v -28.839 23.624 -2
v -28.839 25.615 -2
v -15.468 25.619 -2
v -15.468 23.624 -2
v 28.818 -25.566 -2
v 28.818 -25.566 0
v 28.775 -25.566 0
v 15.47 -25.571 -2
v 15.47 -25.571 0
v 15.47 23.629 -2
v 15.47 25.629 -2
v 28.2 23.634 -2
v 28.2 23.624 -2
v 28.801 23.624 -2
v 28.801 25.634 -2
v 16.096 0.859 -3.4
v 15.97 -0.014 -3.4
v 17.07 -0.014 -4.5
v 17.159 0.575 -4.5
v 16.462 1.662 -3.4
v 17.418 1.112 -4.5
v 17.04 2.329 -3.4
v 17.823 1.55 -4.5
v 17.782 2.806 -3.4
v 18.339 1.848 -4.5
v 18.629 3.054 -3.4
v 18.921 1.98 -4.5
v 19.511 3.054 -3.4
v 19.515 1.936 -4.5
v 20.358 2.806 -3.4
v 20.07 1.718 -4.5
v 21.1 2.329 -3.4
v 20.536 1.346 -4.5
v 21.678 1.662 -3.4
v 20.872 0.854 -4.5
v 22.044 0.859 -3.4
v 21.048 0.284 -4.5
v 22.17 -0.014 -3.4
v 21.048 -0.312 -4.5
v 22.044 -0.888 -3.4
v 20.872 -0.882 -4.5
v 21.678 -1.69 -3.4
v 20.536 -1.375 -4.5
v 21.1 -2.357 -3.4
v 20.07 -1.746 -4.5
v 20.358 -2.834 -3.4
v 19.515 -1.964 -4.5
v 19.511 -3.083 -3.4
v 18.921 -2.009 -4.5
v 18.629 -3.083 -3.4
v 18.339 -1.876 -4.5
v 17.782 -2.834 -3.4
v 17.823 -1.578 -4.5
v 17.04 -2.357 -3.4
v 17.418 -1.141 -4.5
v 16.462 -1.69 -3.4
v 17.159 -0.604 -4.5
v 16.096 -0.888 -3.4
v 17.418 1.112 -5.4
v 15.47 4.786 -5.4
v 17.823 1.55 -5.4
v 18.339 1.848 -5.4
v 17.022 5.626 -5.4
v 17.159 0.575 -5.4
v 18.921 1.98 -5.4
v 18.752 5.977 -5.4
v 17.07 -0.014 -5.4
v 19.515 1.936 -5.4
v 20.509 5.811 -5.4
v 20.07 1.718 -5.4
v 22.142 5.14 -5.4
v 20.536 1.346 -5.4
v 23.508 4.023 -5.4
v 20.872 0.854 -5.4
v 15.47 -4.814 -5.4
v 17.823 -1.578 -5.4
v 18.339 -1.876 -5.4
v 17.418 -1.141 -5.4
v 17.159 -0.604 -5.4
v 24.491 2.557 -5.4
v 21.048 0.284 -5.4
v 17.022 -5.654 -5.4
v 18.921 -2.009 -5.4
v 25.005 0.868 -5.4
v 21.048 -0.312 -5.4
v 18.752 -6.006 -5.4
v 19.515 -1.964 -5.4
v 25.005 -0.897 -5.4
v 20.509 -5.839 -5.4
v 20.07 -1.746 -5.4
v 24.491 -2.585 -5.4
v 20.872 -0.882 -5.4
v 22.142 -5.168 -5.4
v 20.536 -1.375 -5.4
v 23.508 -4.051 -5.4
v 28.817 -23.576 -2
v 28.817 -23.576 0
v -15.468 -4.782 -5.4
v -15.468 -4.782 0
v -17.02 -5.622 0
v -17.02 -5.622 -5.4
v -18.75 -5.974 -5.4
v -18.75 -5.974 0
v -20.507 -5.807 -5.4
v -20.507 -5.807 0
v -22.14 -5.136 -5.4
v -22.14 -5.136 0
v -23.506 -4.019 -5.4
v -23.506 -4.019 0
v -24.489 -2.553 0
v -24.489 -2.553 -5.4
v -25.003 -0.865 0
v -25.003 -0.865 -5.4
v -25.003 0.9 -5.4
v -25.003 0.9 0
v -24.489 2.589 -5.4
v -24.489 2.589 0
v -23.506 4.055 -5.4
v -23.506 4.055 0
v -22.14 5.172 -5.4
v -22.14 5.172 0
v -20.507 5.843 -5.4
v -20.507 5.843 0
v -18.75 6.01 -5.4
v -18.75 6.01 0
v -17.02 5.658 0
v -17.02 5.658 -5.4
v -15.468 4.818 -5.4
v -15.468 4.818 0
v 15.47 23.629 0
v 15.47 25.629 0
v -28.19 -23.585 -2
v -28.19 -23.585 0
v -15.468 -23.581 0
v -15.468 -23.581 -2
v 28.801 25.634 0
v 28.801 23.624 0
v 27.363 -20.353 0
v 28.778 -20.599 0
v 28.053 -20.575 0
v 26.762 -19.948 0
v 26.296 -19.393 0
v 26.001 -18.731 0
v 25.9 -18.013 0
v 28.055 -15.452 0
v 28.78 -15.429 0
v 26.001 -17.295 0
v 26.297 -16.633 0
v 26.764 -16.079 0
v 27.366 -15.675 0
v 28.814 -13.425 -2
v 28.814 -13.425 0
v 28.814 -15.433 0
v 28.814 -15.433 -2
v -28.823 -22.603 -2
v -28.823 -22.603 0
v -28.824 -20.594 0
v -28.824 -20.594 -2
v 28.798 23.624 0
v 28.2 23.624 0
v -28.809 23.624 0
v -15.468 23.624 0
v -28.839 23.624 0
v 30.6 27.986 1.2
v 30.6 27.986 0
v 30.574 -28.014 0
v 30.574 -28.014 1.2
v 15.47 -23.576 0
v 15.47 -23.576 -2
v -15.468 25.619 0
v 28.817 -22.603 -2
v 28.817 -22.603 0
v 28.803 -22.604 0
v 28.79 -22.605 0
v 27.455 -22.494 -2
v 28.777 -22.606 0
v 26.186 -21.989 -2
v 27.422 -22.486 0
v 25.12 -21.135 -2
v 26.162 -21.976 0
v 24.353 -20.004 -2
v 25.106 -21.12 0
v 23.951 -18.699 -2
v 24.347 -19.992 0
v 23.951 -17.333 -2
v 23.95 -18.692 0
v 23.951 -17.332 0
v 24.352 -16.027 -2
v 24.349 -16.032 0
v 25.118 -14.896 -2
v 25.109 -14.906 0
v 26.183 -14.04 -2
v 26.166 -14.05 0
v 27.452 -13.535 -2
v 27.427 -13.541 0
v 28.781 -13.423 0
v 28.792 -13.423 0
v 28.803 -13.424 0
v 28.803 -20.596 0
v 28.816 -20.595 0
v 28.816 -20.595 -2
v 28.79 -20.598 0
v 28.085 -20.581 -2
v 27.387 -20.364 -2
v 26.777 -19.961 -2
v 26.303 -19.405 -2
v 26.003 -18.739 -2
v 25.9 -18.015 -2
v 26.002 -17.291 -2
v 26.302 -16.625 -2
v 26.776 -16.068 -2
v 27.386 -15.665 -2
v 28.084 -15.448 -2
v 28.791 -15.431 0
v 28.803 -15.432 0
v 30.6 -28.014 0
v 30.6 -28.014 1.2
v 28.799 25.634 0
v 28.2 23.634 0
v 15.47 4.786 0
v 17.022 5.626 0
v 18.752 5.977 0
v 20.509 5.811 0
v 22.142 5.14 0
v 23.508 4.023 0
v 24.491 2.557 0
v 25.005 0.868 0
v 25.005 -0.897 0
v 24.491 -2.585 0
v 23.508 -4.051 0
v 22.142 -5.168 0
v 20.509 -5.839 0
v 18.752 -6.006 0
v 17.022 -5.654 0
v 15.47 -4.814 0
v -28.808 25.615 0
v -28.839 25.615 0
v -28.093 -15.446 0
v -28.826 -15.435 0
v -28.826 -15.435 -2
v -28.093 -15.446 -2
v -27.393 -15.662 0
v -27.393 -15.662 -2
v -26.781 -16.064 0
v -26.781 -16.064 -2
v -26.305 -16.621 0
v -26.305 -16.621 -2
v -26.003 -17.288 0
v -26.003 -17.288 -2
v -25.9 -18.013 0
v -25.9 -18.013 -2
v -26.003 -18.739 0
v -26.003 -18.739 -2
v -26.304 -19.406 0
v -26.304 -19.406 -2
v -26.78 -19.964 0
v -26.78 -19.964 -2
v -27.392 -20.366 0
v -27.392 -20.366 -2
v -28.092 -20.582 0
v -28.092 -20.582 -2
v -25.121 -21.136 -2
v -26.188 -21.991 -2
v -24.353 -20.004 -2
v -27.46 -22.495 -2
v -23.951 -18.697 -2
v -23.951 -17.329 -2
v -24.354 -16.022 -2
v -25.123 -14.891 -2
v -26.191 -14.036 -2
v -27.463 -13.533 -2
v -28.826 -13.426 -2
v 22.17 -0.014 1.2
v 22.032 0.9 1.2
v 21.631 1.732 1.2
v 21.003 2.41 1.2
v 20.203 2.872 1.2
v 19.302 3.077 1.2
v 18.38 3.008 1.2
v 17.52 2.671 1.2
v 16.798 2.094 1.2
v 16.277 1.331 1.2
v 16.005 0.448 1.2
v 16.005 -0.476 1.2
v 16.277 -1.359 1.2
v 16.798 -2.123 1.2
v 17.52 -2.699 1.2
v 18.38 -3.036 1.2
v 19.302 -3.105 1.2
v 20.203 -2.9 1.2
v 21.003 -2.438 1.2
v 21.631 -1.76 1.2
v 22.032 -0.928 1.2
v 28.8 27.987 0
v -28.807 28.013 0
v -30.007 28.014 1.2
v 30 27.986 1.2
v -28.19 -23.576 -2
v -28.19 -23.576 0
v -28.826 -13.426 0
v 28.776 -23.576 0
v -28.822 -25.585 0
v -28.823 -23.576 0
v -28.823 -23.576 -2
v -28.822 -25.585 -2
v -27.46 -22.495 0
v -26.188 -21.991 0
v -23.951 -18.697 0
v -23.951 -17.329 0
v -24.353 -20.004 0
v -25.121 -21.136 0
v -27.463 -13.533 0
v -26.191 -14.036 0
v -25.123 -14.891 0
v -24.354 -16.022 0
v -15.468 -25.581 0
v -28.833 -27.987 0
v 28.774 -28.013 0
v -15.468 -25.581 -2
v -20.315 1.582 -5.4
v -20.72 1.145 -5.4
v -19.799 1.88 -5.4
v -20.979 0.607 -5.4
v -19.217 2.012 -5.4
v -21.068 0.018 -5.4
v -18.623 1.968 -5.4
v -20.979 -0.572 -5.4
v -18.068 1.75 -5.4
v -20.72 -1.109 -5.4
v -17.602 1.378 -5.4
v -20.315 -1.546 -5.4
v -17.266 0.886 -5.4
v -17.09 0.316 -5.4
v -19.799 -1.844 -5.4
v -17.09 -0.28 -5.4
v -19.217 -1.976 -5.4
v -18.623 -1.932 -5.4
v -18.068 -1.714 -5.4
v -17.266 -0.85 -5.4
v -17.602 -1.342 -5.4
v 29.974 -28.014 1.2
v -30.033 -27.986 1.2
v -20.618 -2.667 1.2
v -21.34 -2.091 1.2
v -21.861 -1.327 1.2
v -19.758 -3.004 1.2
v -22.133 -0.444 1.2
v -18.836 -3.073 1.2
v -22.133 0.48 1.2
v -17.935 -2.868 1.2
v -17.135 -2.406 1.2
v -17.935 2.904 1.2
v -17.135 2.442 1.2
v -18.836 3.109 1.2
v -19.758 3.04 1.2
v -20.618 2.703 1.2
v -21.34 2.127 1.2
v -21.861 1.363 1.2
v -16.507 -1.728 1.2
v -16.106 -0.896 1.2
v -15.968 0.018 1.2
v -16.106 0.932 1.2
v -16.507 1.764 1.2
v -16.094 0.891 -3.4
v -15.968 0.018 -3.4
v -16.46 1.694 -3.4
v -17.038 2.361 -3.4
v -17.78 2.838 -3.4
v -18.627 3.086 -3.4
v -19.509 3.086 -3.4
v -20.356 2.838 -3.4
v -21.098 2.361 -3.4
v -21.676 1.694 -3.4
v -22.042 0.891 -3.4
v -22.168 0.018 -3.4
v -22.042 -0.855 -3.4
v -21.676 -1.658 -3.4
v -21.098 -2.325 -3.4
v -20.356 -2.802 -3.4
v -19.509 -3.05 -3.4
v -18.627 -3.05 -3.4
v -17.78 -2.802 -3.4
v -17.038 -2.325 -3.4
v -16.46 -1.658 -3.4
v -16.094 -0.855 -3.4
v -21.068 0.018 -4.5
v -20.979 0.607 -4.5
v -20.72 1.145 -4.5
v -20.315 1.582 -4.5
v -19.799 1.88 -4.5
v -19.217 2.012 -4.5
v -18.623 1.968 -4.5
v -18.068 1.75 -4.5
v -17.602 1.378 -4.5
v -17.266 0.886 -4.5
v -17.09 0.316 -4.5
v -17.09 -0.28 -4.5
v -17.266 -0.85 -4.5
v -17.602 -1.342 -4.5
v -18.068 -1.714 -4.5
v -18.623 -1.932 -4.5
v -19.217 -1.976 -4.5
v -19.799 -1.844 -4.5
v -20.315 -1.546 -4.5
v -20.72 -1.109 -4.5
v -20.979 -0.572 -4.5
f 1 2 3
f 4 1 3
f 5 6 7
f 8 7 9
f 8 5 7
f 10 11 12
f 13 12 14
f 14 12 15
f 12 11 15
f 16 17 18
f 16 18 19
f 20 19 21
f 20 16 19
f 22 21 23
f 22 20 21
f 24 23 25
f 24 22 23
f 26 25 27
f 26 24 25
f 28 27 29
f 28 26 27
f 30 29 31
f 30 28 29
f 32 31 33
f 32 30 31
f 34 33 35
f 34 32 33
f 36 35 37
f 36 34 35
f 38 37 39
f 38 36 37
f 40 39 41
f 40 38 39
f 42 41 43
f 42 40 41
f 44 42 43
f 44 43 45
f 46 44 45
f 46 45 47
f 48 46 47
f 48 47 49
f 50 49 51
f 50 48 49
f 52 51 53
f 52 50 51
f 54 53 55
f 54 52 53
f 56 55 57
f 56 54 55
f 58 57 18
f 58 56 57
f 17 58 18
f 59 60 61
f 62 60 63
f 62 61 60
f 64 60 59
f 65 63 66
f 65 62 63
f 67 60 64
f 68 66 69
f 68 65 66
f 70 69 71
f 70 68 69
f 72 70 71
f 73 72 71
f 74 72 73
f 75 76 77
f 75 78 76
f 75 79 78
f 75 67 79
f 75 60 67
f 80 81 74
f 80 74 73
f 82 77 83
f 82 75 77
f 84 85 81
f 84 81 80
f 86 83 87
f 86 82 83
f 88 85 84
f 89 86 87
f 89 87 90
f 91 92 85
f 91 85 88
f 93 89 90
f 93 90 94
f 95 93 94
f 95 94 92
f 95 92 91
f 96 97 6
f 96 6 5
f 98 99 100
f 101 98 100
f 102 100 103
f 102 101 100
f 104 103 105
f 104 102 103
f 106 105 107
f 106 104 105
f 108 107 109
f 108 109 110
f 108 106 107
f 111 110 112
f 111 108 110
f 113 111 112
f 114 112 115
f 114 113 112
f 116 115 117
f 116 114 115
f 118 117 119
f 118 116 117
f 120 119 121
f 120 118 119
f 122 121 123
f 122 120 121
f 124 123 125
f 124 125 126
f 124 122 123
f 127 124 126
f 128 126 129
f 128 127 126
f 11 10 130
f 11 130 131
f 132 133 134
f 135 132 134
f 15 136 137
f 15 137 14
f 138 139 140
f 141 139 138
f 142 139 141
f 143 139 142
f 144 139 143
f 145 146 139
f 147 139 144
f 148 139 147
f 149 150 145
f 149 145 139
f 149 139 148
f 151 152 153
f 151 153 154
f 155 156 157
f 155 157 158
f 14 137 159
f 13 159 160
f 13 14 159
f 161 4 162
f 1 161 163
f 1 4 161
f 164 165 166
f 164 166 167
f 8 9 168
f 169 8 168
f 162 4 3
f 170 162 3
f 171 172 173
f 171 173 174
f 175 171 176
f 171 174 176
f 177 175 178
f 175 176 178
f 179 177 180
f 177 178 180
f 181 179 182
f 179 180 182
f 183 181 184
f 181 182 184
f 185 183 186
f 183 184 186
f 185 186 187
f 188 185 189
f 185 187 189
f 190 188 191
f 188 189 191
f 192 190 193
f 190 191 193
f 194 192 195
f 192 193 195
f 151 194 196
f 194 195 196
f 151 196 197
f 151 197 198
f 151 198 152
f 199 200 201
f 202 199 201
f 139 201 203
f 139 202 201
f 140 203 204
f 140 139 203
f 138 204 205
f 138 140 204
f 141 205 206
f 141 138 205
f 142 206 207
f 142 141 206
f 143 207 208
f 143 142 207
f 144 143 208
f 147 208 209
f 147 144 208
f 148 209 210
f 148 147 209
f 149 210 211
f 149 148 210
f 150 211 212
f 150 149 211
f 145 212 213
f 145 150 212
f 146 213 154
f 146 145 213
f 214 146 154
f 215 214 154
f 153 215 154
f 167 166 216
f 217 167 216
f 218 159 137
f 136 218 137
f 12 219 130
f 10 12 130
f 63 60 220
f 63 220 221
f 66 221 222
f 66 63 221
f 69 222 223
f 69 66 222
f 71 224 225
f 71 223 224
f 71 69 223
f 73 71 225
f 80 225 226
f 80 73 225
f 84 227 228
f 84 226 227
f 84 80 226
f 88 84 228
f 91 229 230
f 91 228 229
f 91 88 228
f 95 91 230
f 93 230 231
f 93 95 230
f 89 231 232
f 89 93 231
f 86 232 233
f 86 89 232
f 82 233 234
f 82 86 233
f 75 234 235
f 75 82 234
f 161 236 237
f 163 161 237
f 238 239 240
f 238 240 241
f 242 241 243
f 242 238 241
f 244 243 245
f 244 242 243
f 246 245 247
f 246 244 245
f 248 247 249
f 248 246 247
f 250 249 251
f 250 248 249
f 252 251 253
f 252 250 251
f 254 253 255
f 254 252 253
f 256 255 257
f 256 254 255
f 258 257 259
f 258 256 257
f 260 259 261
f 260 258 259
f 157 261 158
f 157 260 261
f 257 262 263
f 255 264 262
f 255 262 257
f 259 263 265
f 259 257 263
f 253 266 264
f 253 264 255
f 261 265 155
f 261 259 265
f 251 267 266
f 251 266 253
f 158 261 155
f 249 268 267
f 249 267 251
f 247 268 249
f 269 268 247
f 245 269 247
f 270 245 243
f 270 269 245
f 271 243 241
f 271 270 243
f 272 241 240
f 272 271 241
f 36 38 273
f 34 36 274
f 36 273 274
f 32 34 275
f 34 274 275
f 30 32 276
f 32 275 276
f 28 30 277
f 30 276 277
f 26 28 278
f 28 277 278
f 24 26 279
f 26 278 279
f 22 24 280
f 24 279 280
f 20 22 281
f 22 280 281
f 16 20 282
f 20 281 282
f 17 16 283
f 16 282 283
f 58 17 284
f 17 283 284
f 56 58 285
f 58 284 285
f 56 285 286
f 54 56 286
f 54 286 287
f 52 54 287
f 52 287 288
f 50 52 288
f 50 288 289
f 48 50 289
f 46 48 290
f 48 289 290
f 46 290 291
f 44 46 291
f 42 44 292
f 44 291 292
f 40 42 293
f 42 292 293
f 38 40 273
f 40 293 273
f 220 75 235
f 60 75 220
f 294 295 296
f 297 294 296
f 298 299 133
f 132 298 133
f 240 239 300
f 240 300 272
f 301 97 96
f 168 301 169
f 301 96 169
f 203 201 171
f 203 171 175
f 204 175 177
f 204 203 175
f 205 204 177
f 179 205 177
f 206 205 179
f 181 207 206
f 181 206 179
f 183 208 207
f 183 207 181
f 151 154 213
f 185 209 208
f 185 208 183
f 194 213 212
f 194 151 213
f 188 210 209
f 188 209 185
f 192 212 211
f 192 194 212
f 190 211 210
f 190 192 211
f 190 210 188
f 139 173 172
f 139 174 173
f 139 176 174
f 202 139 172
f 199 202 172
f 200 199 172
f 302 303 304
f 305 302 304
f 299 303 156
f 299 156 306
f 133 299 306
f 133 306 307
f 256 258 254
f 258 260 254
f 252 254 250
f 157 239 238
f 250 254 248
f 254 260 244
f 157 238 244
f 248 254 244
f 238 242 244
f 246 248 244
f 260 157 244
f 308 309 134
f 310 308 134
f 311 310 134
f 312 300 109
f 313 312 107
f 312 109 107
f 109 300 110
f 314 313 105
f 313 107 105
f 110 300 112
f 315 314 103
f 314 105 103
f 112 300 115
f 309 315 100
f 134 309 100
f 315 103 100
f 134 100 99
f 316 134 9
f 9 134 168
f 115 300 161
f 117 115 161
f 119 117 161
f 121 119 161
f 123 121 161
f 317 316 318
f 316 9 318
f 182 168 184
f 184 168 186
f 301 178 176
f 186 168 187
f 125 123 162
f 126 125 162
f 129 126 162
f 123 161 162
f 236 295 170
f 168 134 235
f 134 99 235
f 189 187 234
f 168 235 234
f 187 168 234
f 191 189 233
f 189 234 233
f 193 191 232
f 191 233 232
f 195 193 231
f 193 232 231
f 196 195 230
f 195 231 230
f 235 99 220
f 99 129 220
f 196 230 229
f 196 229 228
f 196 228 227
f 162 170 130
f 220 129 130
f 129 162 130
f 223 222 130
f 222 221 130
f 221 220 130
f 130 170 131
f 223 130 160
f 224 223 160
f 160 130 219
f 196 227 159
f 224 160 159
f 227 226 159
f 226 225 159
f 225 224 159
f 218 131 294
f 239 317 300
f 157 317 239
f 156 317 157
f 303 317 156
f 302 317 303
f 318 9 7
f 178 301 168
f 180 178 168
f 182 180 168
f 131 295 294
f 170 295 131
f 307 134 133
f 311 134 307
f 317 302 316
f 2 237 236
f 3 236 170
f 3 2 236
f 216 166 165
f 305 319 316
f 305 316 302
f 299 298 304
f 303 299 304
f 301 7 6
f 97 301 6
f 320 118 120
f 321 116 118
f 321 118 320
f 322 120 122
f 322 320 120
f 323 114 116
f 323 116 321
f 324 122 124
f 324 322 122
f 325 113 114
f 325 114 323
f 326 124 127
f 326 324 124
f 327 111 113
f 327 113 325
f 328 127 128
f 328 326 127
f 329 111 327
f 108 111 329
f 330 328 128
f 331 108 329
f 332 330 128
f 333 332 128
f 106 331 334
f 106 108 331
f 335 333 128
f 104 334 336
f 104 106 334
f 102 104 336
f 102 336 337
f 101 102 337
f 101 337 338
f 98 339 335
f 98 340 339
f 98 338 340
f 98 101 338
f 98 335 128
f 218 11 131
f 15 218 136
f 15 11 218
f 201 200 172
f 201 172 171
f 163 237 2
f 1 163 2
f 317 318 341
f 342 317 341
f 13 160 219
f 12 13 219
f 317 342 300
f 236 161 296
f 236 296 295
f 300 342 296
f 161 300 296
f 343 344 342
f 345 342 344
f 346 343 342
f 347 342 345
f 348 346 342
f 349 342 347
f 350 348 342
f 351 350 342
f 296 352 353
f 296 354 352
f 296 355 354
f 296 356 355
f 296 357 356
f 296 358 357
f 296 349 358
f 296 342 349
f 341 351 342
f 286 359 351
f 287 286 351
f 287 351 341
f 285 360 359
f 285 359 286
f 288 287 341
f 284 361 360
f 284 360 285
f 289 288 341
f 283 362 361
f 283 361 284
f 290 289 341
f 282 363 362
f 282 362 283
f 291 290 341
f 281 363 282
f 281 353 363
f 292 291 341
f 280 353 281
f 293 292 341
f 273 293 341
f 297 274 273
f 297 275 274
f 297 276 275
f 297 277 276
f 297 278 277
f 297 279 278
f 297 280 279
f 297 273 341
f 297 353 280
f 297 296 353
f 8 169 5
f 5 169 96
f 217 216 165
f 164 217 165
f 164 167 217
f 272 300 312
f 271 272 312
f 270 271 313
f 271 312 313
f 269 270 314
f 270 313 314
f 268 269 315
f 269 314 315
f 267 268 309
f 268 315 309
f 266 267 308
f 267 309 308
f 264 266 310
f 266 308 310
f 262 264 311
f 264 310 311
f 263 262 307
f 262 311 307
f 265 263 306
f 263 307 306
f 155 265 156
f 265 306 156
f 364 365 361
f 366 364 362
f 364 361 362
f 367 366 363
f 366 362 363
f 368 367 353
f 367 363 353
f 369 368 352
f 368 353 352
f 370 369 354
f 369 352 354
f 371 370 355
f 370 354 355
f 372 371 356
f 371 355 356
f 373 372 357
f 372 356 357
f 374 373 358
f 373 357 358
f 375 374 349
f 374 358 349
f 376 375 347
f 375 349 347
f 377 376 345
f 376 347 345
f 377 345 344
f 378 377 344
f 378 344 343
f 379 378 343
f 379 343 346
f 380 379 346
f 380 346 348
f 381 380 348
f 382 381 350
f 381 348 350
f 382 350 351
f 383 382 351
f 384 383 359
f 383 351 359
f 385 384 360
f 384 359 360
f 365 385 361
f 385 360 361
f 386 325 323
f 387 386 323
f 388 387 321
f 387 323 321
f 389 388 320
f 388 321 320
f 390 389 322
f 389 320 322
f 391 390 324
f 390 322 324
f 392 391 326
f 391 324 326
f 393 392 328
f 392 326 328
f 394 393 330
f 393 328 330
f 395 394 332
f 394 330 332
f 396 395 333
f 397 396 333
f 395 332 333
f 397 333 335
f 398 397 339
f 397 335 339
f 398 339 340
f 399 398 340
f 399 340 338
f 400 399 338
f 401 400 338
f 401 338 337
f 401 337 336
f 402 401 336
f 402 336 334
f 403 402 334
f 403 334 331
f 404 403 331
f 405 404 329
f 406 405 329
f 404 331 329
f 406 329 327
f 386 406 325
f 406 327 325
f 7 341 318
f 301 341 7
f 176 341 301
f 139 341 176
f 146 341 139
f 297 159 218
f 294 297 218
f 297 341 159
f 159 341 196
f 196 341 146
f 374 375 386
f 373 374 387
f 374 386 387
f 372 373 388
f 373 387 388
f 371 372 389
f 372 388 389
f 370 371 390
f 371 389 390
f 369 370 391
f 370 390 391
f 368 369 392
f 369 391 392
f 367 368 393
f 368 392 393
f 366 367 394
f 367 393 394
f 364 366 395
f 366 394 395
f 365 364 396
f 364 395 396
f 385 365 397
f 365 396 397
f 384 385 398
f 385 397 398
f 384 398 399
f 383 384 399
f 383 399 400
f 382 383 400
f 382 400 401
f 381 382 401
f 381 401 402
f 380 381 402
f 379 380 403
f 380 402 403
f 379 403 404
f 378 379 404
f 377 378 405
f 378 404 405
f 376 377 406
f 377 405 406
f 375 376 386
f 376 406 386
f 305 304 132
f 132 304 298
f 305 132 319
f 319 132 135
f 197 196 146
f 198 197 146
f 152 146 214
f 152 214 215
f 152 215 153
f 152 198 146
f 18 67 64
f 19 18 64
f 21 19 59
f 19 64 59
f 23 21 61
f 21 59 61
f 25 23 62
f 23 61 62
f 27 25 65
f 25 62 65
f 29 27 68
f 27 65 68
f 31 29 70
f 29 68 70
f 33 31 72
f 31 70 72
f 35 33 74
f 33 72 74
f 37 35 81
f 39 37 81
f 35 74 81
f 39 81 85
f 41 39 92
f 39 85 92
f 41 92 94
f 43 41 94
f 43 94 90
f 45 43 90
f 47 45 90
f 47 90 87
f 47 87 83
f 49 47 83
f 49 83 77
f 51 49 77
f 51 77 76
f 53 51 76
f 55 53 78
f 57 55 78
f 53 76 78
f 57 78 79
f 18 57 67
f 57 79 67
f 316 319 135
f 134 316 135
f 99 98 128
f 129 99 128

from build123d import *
from build123d.topology import SkipClean

# Parameters (mm, degrees)
SKETCH_3_R          = 2.6
EXTRUDE_1_DEPTH     = 1.2
EXTRUDE_1_2_DEPTH   = 2
CUT_EXTRUDE_2_DEPTH = 2
SKETCH_7_W          = 61.190195572
SKETCH_7_H          = 47.2
CUT_EXTRUDE_1_DEPTH = 2
EXTRUDE_START       = 5.4
SKETCH_8_R          = 6
SKETCH_8_R_2        = 2.6
EXTRUDE_2_DEPTH     = 5.4
SKETCH_9_R          = 3
SKETCH_9_R_2        = 2
EXTRUDE_2_2_DEPTH   = 2
SKETCH_10_R         = 4.6
SKETCH_10_R_2       = 2
EXTRUDE_3_DEPTH     = 2
CUT_EXTRUDE_START   = -2
SKETCH_11_R         = 2.6
SKETCH_11_R_2       = 2
CUT_EXTRUDE_3_DEPTH = 2
CUT_EXTRUDE_4_DEPTH = 62
SKETCH_13_W         = 4.275106326
SKETCH_13_H         = 2
SKETCH_13_W_2       = 4.284804349
CUT_EXTRUDE_5_DEPTH = 62
SKETCH_14_W         = 30.93798866
SKETCH_14_H         = 51.210222553
CUT_EXTRUDE_6_DEPTH = 5.4
SKETCH_17_R         = 3.1
CUT_EXTRUDE_8_DEPTH = 4.6
CHAMFER_1_SIZE      = 1.1


with BuildPart() as part:
    # Эскиз3 → Extrude 1 (new body)
    with BuildSketch(Plane.XY):
        Polygon((30.6, -28.01415885), (30.6, 27.98584115), (-30.607237283, 28.01415885), (-30.588738779, -27.985838095), align=None)
        with Locations((-19.06798866, 0.017969087)):
            Circle(SKETCH_3_R, mode=Mode.SUBTRACT)
        with Locations((19.07, -0.01415885)):
            Circle(SKETCH_3_R, mode=Mode.SUBTRACT)
    extrude(amount=EXTRUDE_1_DEPTH)

    # Эскиз5 → Extrude 1 2 (add)
    with BuildSketch(Plane(origin=(0, 0, 0), x_dir=(-1, 0, 0), z_dir=(0, 0, -1))):
        Polygon((-30.6, 26.034377354), (30.606576622, 26.014158959), (30.58939944, -25.985838204), (-30.6, -25.965625483), align=None)
        Polygon((-28.2, 23.63358443), (28.20578396, 23.614951883), (28.190192364, -23.585045542), (-28.2, -23.566418145), align=None, mode=Mode.SUBTRACT)
    extrude(amount=EXTRUDE_1_2_DEPTH)

    # Эскиз6 → Вырез-Вытянуть-Тонкостенный2 (cut)
    with BuildSketch(Plane(origin=(0, 0, -2), x_dir=(-1, 0, 0), z_dir=(0, 0, -1))):
        Polygon((-30.6, 26.034377354), (-30.6, -25.965625483), (30.58939944, -25.985838204), (30.606576622, 26.014158959), align=None)
        Polygon((-30.2, 25.6342452), (-30.2, -25.565757593), (30.189531594, -25.585706094), (30.206444512, 25.614291113), align=None, mode=Mode.SUBTRACT)
    extrude(amount=-CUT_EXTRUDE_2_DEPTH, mode=Mode.SUBTRACT)

    # Эскиз7 → Вырез-Вытянуть1 (cut)
    with BuildSketch(Plane(origin=(0, 0, -2), x_dir=(-1, 0, 0), z_dir=(0, 0, -1))):
        with Locations((-0.004902214, 0.024268156)):
            Rectangle(SKETCH_7_W, SKETCH_7_H)
    extrude(amount=-CUT_EXTRUDE_1_DEPTH, mode=Mode.SUBTRACT)

    # Эскиз8 → Extrude 2 (add)
    # profile 1 of 2: a face of its own
    with SkipClean():  # the faces are left unmerged after this step: merging them gives an invalid solid
        with BuildSketch(Plane(origin=(0, 0, 0), x_dir=(-1, 0, 0), z_dir=(0, 0, -1)).offset(EXTRUDE_START)):
            with Locations(Location((-19.07, -0.01415885, 0), (0, 0, 180))):
                Circle(SKETCH_8_R)
            with Locations((-19.07, -0.01415885)):
                Circle(SKETCH_8_R_2, mode=Mode.SUBTRACT)
        # profile 2 of 2: a face of its own
        with BuildSketch(Plane(origin=(0, 0, 0), x_dir=(-1, 0, 0), z_dir=(0, 0, -1)).offset(EXTRUDE_START)):
            with Locations(Location((19.06798866, 0.017969087, 0), (0, 0, 180))):
                Circle(SKETCH_8_R)
            with Locations((19.06798866, 0.017969087)):
                Circle(SKETCH_8_R_2, mode=Mode.SUBTRACT)
        extrude(amount=-EXTRUDE_2_DEPTH)

    # Эскиз9 → Extrude 2 2 (add)
    # profile 1 of 2: a face of its own
    with SkipClean():  # the faces are left unmerged after this step: merging them gives an invalid solid
        with BuildSketch(Plane(origin=(0, 0, -5.4), x_dir=(-1, 0, 0), z_dir=(0, 0, -1))):
            with Locations((-19.07, -0.01415885)):
                Circle(SKETCH_9_R)
            with Locations((-19.07, -0.01415885)):
                Circle(SKETCH_9_R_2, mode=Mode.SUBTRACT)
        # profile 2 of 2: a face of its own
        with BuildSketch(Plane(origin=(0, 0, -5.4), x_dir=(-1, 0, 0), z_dir=(0, 0, -1))):
            with Locations((19.06798866, 0.017969087)):
                Circle(SKETCH_9_R)
            with Locations((19.06798866, 0.017969087)):
                Circle(SKETCH_9_R_2, mode=Mode.SUBTRACT)
        extrude(amount=-EXTRUDE_2_2_DEPTH)

    # Эскиз10 → Вытянуть-Тонкостенный3 (add)
    # profile 1 of 2: a face of its own
    with SkipClean():  # the faces are left unmerged after this step: merging them gives an invalid solid
        with BuildSketch(Plane(origin=(0, 0, 0), x_dir=(-1, 0, 0), z_dir=(0, 0, -1))):
            with Locations((28.5, -18.01415885)):
                Circle(SKETCH_10_R)
            with Locations((28.5, -18.01415885)):
                Circle(SKETCH_10_R_2, mode=Mode.SUBTRACT)
        # profile 2 of 2: a face of its own
        with BuildSketch(Plane(origin=(0, 0, 0), x_dir=(-1, 0, 0), z_dir=(0, 0, -1))):
            with Locations((-28.5, -18.01415885)):
                Circle(SKETCH_10_R)
            with Locations((-28.5, -18.01415885)):
                Circle(SKETCH_10_R_2, mode=Mode.SUBTRACT)
        extrude(amount=EXTRUDE_3_DEPTH)

    # Эскиз11 → Вырез-Вытянуть-Тонкостенный3 (cut)
    # profile 1 of 2: a face of its own
    with SkipClean():  # the faces are left unmerged after this step: merging them gives an invalid solid
        with BuildSketch(Plane(origin=(0, 0, -2), x_dir=(-1, 0, 0), z_dir=(0, 0, -1)).offset(CUT_EXTRUDE_START)):
            with Locations((28.5, -18.01415885)):
                Circle(SKETCH_11_R)
            with Locations((28.5, -18.01415885)):
                Circle(SKETCH_11_R_2, mode=Mode.SUBTRACT)
        # profile 2 of 2: a face of its own
        with BuildSketch(Plane(origin=(0, 0, -2), x_dir=(-1, 0, 0), z_dir=(0, 0, -1)).offset(CUT_EXTRUDE_START)):
            with Locations((-28.5, -18.01415885)):
                Circle(SKETCH_11_R)
            with Locations((-28.5, -18.01415885)):
                Circle(SKETCH_11_R_2, mode=Mode.SUBTRACT)
        extrude(amount=CUT_EXTRUDE_3_DEPTH, mode=Mode.SUBTRACT)

    # Эскиз12 → Вырез-Вытянуть4 (cut)
    with SkipClean():  # the faces are left unmerged after this step: merging them gives an invalid solid
        with BuildSketch(Plane(origin=(0.012954275, 27.999992332, 0), x_dir=(0.9999998929762139, -0.0004626527434190302, 0), z_dir=(0.0004626527434190302, 0.9999998929762139, 0))):
            Polygon((29.987048999, -1.2), (28.787048999, 0), (30.587048999, 0), (30.587048999, -1.2), align=None)
            Polygon((-30.020194835, -1.2), (-28.820194835, 0), (-30.620194835, 0), (-30.620194835, -1.2), align=None)
        extrude(amount=-CUT_EXTRUDE_4_DEPTH, mode=Mode.SUBTRACT)

    # Эскиз13 → Вырез-Вытянуть5 (cut)
    with SkipClean():  # the faces are left unmerged after this step: merging them gives an invalid solid
        with BuildSketch(Plane(origin=(-0.008464475, 25.624266425, 0), x_dir=(0.9999999454409052, 0.00033033042028954735, 0), z_dir=(-0.00033033042028954735, 0.9999999454409053, 0))):
            with Locations((-30.968395907, 1)):
                Rectangle(SKETCH_13_W, SKETCH_13_H)
            with Locations((30.951645646, 1)):
                Rectangle(SKETCH_13_W_2, SKETCH_13_H)
        extrude(amount=-CUT_EXTRUDE_5_DEPTH, mode=Mode.SUBTRACT)


with BuildPart() as cut_extrude_5_piece_1:
    # of the separate pieces the step leaves, piece 1, a body of its own (cut_extrude_5_pieces)
    add(part.part.solids().sort_by_distance((23.9, -18.01415885, 0))[0])

    # Эскиз14 → Вырез-Вытянуть6 (cut)
    with SkipClean():  # the faces are left unmerged after this step: merging them gives an invalid solid
        with BuildSketch(Plane(origin=(0, 0, -5.4), x_dir=(-1, 0, 0), z_dir=(0, 0, -1))):
            with Locations((-0.00100567, 0.024268156)):
                Rectangle(SKETCH_14_W, SKETCH_14_H)
        extrude(amount=-CUT_EXTRUDE_6_DEPTH, mode=Mode.SUBTRACT)

    # Эскиз17 → Вырез-Вытянуть8 (cut)
    with BuildSketch(Plane.XY.offset(1.2)):
        with Locations((-19.06798866, 0.017969087)):
            Circle(SKETCH_17_R)
        with Locations((19.07, -0.01415885)):
            Circle(SKETCH_17_R)
    extrude(amount=-CUT_EXTRUDE_8_DEPTH, mode=Mode.SUBTRACT)

    # Фаска1
    chamfer_1_edges = [cut_extrude_5_piece_1.edges().sort_by_distance(p)[0] for p in [
        (21.07, -0.01415885, -3.4),
        (-17.06798866, 0.017969087, -3.4),
    ]]
    chamfer(chamfer_1_edges, length=CHAMFER_1_SIZE - 0.0001)  # a hair under: the kernel refuses the full size


with BuildPart() as cut_extrude_5_piece_2:
    # of the separate pieces the step leaves, piece 2, a body of its own (cut_extrude_5_pieces)
    add(part.part.solids().sort_by_distance((30.6, -28.01415885, 0))[0])


solid = Compound([cut_extrude_5_piece_1.part, cut_extrude_5_piece_2.part])
